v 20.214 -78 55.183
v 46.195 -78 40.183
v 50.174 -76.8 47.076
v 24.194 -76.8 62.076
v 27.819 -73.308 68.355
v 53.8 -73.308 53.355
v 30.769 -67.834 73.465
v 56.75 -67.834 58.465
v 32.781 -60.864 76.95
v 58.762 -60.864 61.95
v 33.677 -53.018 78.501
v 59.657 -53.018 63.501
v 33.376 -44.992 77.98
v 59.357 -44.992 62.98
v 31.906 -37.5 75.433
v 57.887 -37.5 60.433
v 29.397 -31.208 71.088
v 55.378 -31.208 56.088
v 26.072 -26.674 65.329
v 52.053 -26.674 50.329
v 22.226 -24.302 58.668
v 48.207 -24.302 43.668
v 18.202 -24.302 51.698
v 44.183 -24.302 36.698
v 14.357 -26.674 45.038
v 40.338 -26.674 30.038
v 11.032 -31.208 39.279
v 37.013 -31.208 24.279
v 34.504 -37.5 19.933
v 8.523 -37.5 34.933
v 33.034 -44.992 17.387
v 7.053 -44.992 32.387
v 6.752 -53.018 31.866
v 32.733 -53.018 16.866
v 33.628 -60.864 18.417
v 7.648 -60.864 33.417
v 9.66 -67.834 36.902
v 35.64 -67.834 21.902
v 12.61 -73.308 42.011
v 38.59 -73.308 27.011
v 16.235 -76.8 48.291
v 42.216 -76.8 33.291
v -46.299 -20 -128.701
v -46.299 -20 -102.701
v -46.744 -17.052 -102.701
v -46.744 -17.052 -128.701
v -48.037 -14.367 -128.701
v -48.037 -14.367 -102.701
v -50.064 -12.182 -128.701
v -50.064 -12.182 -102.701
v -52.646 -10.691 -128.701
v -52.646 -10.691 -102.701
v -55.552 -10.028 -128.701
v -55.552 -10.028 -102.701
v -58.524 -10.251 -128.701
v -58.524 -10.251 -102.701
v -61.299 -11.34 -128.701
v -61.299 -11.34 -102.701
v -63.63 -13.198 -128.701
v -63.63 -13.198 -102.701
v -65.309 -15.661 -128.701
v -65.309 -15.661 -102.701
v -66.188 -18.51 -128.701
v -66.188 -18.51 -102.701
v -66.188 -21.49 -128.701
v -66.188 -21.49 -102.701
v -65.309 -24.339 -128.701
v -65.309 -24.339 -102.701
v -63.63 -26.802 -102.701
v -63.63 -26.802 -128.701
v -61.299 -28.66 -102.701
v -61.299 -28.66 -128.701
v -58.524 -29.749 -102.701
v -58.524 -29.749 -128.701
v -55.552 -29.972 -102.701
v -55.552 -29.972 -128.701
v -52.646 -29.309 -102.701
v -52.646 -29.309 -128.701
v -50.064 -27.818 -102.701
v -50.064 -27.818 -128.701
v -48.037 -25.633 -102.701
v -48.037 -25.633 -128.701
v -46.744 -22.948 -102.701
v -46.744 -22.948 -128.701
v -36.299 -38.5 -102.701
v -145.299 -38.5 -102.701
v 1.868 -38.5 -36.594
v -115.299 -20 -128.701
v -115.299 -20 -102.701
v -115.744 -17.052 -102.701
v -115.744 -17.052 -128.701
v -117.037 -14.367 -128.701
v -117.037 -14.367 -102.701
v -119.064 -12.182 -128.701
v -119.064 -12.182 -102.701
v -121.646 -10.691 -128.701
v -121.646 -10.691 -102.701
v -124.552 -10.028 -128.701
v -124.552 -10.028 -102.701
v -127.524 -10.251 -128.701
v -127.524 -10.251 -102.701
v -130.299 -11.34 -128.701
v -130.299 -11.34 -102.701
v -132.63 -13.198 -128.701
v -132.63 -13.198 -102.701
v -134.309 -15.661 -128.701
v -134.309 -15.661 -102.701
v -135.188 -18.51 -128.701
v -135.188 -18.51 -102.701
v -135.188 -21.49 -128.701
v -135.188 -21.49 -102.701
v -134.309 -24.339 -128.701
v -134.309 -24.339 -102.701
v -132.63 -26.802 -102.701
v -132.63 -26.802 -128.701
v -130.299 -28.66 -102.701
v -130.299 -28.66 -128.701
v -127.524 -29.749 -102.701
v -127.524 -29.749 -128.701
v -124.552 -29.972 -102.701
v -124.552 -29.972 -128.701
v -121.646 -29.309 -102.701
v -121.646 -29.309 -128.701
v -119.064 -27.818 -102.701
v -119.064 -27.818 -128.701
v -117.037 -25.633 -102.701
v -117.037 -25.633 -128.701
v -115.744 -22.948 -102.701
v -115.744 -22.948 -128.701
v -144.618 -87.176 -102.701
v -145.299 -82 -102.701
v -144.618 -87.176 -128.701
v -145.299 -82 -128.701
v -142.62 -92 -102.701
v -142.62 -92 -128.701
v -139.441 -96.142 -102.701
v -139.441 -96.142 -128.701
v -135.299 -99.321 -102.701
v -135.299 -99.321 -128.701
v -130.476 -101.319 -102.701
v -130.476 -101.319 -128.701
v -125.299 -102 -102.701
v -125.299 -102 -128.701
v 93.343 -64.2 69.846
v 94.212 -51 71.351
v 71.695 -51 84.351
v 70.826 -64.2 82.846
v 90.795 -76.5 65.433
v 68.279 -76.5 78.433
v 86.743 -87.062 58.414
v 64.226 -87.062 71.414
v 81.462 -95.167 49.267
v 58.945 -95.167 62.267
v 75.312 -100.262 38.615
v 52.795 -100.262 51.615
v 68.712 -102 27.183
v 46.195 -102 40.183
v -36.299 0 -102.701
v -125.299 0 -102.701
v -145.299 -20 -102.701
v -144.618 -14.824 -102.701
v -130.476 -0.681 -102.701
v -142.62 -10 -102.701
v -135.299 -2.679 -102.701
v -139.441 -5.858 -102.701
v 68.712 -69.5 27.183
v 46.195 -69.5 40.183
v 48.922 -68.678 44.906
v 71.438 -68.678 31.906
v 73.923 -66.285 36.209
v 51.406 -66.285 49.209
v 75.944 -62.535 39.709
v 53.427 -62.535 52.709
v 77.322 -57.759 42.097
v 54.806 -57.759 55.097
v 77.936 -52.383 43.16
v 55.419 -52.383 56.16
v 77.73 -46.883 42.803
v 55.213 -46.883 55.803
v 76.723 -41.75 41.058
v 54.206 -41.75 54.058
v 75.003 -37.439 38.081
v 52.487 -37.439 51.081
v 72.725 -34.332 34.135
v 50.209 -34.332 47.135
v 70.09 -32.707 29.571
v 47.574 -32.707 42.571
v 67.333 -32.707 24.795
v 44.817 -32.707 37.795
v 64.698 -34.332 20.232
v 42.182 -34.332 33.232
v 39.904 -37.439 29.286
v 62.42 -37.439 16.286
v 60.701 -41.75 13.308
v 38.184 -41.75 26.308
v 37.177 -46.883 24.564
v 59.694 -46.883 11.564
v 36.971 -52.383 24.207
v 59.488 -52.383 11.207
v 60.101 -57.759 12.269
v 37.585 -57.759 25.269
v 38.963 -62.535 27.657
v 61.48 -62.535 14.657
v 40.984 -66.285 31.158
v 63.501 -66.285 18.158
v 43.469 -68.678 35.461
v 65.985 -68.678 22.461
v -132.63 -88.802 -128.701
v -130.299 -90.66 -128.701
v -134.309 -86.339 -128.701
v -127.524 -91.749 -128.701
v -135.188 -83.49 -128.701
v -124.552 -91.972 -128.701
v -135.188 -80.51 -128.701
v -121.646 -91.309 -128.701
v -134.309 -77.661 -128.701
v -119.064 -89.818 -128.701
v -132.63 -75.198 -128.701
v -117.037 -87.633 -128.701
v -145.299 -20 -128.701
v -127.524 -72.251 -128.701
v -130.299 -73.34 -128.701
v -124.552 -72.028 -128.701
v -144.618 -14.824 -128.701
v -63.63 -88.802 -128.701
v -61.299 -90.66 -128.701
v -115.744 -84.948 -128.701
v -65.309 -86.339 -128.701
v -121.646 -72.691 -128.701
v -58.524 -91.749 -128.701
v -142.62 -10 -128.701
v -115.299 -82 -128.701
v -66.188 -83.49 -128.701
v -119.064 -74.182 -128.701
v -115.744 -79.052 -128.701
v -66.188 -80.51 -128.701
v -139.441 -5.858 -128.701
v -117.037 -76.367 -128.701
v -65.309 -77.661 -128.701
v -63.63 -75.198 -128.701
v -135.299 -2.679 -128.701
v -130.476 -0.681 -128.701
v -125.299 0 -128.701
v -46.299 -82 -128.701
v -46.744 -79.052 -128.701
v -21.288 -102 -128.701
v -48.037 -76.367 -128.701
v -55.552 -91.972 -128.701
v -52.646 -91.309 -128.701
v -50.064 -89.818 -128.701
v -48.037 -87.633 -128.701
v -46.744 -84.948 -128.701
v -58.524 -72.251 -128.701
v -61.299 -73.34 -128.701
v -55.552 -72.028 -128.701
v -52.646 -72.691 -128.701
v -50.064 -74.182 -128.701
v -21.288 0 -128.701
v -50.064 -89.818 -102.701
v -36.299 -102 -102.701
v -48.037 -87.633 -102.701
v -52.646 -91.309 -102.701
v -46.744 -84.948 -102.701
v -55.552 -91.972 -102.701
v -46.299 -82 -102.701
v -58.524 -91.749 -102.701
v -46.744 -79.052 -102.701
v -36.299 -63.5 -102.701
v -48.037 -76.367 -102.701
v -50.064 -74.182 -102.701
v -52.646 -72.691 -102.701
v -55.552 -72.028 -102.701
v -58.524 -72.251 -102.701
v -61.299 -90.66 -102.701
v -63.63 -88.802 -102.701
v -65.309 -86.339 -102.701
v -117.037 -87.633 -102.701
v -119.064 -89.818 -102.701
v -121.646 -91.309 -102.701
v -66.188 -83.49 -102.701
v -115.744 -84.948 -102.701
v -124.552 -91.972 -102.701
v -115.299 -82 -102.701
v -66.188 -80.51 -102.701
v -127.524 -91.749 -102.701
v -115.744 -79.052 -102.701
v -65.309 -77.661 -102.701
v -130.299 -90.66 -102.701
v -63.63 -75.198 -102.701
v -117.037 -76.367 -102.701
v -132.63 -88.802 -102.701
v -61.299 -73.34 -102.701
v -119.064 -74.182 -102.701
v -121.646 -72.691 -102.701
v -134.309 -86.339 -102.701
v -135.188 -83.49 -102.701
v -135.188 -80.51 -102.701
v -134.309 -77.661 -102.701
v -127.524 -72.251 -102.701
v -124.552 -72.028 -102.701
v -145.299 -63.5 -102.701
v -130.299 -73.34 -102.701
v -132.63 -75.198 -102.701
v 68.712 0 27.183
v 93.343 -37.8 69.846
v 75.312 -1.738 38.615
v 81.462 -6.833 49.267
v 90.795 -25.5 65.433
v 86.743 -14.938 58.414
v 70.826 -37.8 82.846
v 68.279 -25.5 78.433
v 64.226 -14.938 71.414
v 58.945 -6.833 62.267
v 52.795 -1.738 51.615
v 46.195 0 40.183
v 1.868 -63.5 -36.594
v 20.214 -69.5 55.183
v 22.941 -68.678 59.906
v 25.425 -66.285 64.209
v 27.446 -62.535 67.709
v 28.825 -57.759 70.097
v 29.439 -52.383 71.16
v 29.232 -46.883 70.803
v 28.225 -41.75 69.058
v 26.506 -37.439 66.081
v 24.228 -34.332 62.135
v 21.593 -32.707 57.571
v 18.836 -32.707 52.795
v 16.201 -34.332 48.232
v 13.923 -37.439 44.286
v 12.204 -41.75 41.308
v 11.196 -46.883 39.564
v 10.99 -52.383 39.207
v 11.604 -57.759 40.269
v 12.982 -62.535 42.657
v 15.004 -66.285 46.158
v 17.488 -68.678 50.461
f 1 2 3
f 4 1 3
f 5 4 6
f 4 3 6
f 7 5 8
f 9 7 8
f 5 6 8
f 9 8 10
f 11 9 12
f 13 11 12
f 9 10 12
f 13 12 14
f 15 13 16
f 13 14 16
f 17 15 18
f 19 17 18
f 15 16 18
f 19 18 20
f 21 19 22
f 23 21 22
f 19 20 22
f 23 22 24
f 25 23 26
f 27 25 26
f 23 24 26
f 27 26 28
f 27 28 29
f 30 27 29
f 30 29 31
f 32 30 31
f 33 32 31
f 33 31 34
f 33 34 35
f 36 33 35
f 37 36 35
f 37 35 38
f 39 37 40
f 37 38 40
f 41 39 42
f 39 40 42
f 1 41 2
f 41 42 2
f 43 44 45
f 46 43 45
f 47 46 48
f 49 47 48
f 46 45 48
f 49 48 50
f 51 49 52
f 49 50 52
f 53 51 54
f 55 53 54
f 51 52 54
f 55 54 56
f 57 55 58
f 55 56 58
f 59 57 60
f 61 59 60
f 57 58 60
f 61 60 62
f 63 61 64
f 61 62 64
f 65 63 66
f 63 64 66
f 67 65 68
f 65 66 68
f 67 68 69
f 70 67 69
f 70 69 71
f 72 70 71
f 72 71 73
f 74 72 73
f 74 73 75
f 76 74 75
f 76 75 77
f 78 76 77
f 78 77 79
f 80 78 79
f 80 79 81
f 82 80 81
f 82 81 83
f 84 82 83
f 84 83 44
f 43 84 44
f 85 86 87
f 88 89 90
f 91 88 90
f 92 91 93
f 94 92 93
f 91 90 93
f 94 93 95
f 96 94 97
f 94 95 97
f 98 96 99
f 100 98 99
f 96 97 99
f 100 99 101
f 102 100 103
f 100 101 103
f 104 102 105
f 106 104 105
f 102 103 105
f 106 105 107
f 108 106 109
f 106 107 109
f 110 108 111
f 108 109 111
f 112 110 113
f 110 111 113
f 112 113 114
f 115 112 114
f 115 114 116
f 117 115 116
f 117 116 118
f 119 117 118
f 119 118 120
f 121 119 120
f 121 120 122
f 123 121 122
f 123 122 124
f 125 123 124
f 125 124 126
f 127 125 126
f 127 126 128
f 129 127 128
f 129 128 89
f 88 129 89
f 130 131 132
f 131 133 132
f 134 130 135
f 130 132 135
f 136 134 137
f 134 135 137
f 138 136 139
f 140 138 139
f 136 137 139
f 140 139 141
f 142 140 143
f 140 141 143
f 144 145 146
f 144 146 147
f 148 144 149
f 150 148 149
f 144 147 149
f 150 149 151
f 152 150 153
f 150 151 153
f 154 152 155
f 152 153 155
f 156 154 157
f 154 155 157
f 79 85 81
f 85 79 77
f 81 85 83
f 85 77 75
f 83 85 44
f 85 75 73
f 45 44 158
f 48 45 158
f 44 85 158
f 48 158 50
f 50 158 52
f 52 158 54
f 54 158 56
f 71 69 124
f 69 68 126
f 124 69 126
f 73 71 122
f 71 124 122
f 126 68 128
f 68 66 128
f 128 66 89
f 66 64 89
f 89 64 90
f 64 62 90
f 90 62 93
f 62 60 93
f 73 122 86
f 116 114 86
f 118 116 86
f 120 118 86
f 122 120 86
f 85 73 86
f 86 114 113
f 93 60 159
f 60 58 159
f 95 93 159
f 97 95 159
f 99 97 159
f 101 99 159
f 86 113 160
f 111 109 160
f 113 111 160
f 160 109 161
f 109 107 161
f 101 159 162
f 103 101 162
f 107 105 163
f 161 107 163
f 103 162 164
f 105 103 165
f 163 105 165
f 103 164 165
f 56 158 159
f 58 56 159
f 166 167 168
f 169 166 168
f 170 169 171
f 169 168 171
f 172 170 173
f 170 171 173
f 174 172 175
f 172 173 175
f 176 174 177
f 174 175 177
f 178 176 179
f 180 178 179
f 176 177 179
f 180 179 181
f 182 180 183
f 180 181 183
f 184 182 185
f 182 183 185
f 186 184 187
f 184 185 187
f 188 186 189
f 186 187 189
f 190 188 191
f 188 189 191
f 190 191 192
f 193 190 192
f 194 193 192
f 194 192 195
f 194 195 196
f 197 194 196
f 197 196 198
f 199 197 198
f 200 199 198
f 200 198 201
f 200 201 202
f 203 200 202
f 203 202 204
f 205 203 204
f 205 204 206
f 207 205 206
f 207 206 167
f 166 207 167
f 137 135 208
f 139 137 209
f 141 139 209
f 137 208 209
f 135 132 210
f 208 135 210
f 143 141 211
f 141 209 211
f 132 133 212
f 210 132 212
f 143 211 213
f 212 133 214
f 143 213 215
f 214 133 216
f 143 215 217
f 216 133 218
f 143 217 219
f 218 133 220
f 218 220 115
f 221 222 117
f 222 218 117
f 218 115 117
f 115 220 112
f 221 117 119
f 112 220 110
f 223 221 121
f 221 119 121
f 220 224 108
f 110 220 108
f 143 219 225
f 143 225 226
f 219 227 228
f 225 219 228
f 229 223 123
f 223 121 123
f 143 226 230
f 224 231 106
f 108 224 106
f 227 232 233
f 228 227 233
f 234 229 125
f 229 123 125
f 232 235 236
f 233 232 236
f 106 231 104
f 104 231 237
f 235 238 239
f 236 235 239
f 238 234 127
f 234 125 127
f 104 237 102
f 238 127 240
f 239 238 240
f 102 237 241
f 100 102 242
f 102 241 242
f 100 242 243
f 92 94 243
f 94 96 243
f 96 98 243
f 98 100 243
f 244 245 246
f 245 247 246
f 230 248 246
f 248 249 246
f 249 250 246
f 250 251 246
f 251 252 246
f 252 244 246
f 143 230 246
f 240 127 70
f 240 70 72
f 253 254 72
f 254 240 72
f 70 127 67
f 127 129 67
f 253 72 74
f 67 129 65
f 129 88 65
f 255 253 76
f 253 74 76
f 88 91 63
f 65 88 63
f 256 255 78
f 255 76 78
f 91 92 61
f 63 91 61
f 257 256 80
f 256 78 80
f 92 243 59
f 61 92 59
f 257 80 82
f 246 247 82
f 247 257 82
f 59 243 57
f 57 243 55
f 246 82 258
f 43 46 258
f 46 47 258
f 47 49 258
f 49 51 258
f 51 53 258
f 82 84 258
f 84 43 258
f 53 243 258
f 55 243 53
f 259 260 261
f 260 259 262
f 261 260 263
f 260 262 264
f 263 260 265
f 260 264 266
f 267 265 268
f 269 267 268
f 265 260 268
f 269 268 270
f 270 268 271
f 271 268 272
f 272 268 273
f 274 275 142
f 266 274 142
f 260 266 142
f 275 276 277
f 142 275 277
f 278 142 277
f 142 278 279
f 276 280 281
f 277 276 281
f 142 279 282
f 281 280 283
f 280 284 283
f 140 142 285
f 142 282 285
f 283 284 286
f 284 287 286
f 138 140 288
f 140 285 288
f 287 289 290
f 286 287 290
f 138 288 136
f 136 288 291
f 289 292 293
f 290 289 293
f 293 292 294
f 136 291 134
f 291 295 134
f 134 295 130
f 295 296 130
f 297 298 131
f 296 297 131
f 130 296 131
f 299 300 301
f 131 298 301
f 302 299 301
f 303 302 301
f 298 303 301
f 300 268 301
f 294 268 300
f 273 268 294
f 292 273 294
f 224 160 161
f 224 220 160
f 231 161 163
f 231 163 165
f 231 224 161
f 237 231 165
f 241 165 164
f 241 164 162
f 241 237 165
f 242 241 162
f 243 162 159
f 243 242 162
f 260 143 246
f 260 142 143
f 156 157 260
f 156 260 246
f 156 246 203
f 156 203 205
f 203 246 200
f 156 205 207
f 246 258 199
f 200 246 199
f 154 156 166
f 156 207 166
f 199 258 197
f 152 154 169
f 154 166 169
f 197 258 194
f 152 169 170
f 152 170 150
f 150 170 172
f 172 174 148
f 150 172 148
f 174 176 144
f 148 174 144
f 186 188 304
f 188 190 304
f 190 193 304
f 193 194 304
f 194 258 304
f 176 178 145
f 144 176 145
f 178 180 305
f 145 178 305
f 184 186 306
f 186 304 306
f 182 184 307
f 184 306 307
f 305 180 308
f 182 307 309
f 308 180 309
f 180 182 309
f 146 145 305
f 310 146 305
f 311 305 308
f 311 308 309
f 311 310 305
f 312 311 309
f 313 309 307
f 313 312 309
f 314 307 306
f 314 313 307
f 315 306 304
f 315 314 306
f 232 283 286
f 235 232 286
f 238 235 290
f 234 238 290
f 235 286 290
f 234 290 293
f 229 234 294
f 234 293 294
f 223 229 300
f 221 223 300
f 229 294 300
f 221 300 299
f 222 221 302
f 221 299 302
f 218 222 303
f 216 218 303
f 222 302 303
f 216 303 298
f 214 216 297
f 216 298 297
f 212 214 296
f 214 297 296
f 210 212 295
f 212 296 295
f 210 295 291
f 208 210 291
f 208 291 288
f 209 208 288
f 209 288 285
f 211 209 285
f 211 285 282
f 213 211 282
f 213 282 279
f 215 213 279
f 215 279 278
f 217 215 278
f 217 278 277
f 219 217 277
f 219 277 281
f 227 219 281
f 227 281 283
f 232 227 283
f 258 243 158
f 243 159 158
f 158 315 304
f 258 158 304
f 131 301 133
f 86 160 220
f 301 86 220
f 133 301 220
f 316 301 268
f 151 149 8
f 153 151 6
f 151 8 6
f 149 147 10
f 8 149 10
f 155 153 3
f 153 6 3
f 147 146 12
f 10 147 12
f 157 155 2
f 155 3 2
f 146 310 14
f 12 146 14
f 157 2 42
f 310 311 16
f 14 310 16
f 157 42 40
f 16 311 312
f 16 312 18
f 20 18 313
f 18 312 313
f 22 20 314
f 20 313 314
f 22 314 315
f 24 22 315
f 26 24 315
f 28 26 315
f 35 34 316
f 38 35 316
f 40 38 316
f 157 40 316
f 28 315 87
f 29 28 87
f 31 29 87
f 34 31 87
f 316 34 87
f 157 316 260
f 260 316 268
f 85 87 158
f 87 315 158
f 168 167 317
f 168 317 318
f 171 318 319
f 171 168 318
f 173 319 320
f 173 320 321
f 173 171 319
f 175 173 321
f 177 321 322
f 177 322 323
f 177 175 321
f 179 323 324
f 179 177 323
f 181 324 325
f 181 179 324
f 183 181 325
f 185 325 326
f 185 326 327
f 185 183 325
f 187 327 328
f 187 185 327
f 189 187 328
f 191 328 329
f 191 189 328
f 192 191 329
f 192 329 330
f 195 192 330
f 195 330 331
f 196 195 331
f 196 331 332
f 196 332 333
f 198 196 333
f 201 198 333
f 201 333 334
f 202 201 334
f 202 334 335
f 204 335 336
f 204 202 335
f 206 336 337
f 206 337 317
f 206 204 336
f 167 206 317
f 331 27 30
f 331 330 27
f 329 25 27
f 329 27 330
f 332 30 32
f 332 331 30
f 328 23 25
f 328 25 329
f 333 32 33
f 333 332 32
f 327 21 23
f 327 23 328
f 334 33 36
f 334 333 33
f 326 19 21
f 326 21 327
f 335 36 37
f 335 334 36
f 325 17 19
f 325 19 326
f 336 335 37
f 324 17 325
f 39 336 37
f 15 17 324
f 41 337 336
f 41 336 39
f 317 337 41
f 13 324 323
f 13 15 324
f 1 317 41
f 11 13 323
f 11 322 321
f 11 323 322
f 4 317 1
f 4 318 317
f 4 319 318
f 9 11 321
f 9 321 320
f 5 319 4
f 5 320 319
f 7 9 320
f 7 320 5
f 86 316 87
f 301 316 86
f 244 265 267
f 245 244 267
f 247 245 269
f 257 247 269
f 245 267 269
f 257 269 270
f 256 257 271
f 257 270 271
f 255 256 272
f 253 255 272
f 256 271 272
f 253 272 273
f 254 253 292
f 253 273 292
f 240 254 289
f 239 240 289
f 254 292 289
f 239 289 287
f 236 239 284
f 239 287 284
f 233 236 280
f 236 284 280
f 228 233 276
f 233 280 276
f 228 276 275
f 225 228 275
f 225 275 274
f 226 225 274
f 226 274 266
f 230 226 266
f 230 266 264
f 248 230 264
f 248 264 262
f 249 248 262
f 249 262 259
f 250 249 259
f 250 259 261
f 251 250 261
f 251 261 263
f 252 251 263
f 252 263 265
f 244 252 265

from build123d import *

# Parameters (mm, degrees)
F1_DEPTH  = 102
F2_R      = 50.99999
F3_R      = 27
F3_R_2    = 18.5
F4_DEPTH  = 30
F5_R      = 18.5
F6_DEPTH  = 30
F7_R      = 10
F8_DEPTH  = 30
F11_DEPTH = 12.5
F12_R     = 20


# Not quite as in the source:
# - a fillet or chamfer is up to 0.001 mm smaller than in the source, because OpenCascade refuses the exact size


with BuildPart() as f1:
    # F0 (on Front) → F1 (new body)
    with BuildSketch(Plane.XZ):
        Polygon((-36.2992759747, -102.7012261555), (-145.2992759747, -102.7012261555), (-145.2992759747, -128.7012261555), (-21.2881689757, -128.7012261555), (94.2118310243, 71.3506421187), (71.6951705259, 84.3506421187), align=None)
    extrude(amount=F1_DEPTH)

    # F2 (radius 51 in the source; OpenCascade refuses exactly that, so slightly less here)
    f2_edges = [f1.edges().sort_by_distance(p)[0] for p in [
        (82.953501, 0, 77.850642),
        (82.953501, -102, 77.850642),
    ]]
    fillet(f2_edges, radius=F2_R)

    # F3 (on face) → F4 (join)
    with BuildSketch(Plane(origin=(17.2464784442, 0, -9.9572589724), x_dir=(0, -1, 0), z_dir=(-0.8660254038, 0, 0.5))):
        with Locations((51, 57.8973841632)):
            Circle(F3_R)
        with Locations((51, 57.8973841632)):
            Circle(F3_R_2, mode=Mode.SUBTRACT)
    extrude(amount=F4_DEPTH)

    # F5 (on face) → F6 (cut)
    with BuildSketch(Plane(origin=(17.2464784442, 0, -9.9572589724), x_dir=(0, -1, 0), z_dir=(-0.8660254038, 0, 0.5))):
        with Locations((51, 57.8973841632)):
            Circle(F5_R)
    extrude(amount=-F6_DEPTH, mode=Mode.SUBTRACT)

    # F7 (on face) → F8 (cut)
    with BuildSketch(Plane.XY.offset(-102.7012261555)):
        with Locations((-125.2992759747, -20)):
            Circle(F7_R)
        with Locations((-125.2992759747, -82)):
            Circle(F7_R)
        with Locations((-56.2992759747, -20)):
            Circle(F7_R)
        with Locations((-56.2992759747, -82)):
            Circle(F7_R)
    extrude(amount=-F8_DEPTH, mode=Mode.SUBTRACT)

    # F10 (on offset) → F11 (join, symmetric)
    with BuildSketch(Plane.XZ.offset(51)):
        Polygon((-35.6261391794, -102.7012261555), (1.8678903299, -36.5937549351), (-145.2992759747, -102.7012261555), align=None)
    extrude(amount=F11_DEPTH, both=True)

    # F12
    f12_edges = [f1.edges().sort_by_distance(p)[0] for p in [
        (-145.299276, 0, -115.701226),
        (-145.299276, -102, -115.701226),
    ]]
    fillet(f12_edges, radius=F12_R)


solid = f1.part
